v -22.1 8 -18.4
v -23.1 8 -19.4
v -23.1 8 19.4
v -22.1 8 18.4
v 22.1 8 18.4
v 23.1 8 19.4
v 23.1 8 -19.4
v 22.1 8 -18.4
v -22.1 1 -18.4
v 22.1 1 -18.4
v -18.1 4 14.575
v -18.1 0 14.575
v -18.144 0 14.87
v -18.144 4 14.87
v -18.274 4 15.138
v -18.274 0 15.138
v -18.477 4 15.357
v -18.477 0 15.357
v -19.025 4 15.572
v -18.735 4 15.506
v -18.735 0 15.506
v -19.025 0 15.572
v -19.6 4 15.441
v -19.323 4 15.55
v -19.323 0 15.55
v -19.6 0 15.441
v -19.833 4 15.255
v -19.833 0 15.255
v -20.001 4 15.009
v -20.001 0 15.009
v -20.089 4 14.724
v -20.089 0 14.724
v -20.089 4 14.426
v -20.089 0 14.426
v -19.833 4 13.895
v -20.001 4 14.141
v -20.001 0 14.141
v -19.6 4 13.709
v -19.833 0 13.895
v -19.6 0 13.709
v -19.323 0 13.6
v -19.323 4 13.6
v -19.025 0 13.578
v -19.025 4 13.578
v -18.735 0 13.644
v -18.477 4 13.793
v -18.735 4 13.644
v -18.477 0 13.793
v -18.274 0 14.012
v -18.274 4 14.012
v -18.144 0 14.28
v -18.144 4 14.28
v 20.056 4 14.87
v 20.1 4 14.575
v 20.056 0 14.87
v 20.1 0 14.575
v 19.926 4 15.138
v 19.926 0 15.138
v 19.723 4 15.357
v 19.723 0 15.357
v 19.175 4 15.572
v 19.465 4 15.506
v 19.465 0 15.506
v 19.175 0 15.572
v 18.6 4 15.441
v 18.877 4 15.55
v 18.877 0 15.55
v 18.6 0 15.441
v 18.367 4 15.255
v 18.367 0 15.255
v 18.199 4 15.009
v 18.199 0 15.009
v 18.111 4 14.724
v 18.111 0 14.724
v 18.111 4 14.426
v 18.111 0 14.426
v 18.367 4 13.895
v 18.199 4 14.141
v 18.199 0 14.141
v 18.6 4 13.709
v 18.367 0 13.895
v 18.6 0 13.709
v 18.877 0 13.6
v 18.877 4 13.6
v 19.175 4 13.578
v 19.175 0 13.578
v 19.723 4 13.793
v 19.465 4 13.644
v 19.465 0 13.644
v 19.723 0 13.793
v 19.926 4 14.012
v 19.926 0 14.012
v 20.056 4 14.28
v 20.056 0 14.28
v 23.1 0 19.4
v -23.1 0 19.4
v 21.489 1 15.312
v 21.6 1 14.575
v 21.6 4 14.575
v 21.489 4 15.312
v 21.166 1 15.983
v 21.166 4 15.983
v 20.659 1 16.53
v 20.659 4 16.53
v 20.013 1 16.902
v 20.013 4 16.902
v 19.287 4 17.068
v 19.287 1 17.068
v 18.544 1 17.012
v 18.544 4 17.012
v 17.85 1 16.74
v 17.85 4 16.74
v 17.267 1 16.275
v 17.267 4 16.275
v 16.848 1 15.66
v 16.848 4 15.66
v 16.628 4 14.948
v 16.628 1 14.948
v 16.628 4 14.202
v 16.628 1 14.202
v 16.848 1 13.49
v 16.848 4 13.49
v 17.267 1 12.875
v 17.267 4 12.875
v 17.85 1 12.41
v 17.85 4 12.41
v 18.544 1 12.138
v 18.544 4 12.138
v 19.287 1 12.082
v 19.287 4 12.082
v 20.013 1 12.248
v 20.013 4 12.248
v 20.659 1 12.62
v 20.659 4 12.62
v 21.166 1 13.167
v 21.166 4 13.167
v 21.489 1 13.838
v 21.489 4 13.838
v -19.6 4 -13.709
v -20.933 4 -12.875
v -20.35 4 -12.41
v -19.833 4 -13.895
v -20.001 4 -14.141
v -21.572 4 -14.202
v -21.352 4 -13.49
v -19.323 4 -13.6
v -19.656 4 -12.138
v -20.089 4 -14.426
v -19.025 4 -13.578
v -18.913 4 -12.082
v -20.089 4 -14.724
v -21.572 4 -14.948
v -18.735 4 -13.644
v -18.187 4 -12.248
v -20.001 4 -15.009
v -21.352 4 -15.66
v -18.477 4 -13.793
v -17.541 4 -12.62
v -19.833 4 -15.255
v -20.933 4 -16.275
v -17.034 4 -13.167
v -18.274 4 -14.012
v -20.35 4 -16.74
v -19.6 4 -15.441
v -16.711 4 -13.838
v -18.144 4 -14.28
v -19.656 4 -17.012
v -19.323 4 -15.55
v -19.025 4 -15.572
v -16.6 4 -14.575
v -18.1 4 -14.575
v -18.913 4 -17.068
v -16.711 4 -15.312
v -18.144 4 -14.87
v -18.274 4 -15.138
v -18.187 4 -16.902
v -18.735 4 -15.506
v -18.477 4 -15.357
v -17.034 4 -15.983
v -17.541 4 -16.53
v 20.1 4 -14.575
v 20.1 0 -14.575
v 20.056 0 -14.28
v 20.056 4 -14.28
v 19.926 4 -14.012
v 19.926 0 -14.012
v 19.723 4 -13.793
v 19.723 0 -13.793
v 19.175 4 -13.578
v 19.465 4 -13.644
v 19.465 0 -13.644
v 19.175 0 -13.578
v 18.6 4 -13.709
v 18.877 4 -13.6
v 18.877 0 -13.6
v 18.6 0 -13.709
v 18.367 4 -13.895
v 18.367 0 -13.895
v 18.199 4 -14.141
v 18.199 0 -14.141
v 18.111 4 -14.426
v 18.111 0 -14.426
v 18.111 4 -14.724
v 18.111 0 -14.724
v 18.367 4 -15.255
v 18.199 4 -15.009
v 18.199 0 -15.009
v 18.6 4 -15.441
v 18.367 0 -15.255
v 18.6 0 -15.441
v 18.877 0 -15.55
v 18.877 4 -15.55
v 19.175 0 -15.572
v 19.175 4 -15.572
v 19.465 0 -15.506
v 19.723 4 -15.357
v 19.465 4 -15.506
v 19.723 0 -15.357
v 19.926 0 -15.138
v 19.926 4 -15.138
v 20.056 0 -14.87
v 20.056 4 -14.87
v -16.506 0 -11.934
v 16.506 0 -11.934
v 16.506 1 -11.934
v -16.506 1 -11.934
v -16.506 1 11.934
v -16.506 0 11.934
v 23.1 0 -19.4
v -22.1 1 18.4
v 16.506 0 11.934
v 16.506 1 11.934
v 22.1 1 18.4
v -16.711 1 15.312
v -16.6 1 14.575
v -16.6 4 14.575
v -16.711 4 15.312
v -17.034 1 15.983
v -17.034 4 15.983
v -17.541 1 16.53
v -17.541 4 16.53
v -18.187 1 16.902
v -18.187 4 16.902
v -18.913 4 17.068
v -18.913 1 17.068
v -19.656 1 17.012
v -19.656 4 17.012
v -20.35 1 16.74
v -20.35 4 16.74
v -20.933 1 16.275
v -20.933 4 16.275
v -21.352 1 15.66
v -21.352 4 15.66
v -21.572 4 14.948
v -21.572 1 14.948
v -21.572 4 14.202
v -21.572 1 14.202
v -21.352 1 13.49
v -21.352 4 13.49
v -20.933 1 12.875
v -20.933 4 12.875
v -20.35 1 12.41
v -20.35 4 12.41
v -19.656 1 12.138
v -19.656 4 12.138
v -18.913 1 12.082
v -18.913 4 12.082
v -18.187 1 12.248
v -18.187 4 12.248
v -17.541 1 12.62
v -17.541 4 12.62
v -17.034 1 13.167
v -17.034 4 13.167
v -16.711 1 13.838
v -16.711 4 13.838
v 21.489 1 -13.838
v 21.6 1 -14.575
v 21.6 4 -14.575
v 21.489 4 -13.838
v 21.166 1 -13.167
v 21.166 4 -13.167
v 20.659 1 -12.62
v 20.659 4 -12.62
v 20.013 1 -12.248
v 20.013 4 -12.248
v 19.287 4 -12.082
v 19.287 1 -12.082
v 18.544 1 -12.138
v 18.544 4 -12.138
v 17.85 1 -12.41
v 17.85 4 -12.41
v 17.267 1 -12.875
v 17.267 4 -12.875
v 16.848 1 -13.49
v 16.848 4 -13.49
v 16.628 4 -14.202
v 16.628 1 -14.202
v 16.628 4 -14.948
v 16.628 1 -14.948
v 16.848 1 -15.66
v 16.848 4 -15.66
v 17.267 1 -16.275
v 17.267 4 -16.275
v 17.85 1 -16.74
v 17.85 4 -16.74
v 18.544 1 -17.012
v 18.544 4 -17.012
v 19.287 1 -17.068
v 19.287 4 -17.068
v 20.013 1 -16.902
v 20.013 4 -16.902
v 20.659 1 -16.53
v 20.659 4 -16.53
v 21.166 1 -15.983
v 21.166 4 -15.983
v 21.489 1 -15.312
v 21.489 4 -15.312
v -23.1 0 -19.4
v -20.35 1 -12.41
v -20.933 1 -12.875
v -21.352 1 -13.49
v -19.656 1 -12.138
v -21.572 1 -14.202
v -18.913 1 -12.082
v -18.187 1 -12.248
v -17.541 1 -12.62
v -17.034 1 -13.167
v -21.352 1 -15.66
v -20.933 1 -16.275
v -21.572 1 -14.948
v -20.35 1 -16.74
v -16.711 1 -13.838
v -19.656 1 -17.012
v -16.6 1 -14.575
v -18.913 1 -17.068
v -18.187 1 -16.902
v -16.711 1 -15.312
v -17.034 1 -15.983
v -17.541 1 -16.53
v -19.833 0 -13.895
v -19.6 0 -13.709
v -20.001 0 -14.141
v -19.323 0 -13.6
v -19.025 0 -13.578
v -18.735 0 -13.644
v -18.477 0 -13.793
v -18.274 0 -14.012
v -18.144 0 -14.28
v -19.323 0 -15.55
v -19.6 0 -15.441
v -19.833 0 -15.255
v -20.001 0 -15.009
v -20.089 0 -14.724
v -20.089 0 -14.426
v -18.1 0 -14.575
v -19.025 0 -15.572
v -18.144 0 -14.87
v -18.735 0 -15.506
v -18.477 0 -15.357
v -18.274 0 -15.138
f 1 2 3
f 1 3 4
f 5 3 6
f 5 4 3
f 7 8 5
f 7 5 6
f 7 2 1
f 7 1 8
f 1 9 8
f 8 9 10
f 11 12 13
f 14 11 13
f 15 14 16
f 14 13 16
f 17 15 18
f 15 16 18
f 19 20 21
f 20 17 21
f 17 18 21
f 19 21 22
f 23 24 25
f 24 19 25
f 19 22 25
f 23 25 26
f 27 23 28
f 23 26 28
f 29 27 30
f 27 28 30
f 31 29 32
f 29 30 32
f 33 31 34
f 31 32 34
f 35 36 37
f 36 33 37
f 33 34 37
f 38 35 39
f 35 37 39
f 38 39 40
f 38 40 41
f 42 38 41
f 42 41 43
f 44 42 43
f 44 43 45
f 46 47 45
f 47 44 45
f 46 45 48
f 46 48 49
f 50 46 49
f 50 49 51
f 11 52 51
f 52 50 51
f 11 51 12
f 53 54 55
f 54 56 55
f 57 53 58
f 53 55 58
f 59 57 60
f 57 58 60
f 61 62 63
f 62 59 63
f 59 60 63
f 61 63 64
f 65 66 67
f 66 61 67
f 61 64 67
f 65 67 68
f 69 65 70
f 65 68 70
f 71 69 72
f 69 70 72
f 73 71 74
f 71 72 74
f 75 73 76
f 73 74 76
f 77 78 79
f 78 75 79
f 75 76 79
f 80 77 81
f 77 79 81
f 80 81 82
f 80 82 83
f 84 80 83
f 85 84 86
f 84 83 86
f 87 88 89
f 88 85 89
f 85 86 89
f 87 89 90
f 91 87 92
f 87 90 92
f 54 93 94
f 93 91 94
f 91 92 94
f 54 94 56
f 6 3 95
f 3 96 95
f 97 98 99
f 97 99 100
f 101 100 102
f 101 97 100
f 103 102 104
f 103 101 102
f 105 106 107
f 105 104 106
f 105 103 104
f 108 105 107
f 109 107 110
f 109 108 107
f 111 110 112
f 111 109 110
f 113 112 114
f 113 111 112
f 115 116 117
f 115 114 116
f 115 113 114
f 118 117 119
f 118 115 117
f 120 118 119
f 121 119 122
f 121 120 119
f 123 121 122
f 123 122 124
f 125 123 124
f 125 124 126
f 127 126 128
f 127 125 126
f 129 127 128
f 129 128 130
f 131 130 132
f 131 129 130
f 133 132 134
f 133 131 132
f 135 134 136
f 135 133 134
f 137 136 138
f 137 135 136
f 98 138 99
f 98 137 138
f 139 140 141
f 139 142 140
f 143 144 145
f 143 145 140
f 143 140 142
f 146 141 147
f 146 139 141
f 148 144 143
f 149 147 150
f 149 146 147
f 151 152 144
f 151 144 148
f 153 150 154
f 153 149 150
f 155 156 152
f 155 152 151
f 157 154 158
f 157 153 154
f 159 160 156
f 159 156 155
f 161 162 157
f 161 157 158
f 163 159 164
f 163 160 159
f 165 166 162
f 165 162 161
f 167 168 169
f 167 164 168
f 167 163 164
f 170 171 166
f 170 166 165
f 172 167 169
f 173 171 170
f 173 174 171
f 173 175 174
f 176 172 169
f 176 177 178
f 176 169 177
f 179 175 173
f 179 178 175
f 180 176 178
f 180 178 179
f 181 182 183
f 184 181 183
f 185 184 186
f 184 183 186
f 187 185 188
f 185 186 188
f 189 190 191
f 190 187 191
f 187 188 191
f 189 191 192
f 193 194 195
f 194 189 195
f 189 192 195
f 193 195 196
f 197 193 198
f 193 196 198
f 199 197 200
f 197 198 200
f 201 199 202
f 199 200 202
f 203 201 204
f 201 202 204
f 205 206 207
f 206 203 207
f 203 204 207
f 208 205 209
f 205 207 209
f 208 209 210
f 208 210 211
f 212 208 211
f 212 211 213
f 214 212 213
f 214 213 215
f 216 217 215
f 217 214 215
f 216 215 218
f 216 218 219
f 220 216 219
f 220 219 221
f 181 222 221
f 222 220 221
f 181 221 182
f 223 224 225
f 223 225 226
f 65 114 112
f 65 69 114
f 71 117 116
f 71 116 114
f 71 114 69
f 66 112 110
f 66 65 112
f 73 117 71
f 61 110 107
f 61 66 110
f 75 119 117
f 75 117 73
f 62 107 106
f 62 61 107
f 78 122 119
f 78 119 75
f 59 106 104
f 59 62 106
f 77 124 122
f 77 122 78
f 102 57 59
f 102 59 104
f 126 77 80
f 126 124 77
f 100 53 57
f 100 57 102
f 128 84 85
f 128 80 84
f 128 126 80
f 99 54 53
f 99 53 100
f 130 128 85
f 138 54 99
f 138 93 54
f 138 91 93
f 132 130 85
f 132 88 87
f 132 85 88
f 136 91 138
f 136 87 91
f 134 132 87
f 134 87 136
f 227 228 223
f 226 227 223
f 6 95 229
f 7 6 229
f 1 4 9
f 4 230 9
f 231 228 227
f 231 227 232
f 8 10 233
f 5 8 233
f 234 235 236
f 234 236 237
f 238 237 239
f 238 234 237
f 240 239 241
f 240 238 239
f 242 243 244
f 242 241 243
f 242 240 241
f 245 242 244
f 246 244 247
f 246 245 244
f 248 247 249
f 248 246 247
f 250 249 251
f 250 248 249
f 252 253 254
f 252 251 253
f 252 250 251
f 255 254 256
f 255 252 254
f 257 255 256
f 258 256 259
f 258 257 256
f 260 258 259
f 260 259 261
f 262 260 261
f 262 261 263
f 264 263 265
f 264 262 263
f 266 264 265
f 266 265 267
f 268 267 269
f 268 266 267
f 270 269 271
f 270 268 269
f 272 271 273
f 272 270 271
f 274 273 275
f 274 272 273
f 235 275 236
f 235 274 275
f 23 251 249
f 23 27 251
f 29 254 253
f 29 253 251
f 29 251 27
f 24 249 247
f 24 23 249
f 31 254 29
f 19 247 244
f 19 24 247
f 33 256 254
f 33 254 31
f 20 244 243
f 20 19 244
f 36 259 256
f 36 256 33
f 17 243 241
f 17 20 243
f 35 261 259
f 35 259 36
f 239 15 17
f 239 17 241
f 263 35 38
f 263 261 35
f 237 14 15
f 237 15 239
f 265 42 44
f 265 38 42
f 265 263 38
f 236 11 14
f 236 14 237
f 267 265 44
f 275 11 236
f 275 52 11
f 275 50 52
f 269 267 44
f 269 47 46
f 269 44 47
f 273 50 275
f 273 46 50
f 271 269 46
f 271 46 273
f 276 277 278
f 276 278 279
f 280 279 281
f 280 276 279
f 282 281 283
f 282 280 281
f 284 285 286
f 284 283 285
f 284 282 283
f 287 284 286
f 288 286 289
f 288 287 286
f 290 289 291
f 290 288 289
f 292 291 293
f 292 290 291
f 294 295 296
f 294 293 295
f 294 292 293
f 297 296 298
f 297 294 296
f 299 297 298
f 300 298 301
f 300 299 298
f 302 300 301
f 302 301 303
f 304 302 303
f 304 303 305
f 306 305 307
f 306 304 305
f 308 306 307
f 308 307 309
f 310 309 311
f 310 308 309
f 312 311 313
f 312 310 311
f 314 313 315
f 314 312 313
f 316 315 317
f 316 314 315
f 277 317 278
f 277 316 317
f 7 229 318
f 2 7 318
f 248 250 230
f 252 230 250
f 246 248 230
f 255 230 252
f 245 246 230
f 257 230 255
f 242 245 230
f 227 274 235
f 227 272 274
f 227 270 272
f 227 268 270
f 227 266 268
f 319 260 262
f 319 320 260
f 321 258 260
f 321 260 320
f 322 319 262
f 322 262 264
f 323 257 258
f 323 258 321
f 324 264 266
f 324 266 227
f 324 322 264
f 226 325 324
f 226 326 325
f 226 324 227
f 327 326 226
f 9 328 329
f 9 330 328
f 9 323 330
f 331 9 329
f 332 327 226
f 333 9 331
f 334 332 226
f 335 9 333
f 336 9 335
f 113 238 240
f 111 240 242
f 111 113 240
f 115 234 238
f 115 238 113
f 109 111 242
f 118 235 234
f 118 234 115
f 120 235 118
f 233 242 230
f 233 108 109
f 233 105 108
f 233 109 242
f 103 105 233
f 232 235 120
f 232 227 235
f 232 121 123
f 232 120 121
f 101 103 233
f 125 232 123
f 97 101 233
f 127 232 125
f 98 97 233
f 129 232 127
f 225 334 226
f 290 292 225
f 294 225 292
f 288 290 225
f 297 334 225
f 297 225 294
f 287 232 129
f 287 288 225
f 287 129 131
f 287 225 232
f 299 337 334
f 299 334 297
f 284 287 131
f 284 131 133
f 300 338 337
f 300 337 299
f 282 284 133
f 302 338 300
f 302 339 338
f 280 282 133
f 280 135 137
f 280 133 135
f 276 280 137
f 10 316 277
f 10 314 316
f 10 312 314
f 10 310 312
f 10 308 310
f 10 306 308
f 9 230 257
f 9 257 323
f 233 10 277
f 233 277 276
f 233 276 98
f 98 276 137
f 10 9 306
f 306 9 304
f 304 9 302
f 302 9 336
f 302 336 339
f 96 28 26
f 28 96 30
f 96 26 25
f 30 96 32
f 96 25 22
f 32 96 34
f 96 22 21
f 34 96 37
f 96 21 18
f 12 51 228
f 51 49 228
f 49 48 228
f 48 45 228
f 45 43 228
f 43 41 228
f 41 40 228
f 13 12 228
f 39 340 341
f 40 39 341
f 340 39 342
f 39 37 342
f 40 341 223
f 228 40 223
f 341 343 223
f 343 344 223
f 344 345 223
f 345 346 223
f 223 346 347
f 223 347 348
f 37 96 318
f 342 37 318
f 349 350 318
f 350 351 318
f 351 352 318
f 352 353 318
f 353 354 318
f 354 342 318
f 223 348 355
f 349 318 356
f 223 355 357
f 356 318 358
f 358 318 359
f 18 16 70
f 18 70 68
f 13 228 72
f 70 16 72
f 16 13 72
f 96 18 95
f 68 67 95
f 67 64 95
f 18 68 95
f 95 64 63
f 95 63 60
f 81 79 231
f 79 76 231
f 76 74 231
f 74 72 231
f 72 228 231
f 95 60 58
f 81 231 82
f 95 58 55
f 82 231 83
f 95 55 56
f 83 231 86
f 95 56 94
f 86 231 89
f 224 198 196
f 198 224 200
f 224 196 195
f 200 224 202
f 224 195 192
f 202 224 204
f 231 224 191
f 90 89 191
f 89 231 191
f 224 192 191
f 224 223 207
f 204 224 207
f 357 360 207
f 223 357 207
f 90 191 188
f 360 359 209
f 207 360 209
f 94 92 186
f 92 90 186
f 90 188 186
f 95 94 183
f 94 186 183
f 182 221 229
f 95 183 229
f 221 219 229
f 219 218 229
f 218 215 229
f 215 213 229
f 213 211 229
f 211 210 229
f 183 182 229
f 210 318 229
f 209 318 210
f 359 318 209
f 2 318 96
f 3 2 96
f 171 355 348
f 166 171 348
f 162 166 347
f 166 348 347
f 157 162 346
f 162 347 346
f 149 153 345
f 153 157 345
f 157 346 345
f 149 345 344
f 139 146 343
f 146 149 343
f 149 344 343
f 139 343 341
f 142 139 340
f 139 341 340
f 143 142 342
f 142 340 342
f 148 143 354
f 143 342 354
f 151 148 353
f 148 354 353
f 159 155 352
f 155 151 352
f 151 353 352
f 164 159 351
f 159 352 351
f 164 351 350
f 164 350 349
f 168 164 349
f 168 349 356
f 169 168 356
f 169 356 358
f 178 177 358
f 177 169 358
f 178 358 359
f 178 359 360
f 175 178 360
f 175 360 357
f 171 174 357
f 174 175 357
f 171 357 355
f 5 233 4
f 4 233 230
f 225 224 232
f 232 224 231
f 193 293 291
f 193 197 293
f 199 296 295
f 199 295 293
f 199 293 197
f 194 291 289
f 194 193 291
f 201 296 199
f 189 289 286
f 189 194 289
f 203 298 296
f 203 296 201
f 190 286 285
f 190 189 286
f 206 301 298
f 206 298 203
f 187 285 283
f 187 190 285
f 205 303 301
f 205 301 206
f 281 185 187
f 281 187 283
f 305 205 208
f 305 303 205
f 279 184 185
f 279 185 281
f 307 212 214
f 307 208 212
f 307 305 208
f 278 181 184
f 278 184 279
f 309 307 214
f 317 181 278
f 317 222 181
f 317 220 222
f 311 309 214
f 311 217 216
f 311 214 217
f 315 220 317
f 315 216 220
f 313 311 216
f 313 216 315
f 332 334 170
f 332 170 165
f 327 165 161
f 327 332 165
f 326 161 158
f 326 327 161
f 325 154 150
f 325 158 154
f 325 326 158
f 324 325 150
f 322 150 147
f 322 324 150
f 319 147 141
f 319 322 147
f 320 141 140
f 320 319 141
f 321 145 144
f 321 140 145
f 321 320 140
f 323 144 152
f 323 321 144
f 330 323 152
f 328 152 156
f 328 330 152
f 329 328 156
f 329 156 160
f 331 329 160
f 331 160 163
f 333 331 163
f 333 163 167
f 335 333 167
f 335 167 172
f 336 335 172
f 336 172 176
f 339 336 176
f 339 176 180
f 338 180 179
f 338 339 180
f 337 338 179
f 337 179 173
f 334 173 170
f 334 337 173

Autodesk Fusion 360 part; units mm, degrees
sketch "Sketch1" plane through (0, 0, 0) normal (0, 1, 0) x (1, 0, 0)
  line L0 (19.1, 14.575) -> (-19.1, 14.575) construction
  line L1 (-19.1, 14.575) -> (-19.1, -14.575) construction
  line L2 (-19.1, -14.575) -> (19.1, -14.575) construction
  line L3 (19.1, -14.575) -> (19.1, 14.575) construction
  line L4 (19.1, 14.575) -> (-19.1, -14.575) construction
  line L5 (-19.1, 14.575) -> (19.1, -14.575) construction
  circle A0 centre (-19.1, 14.575) radius 1
  circle A1 centre (19.1, 14.575) radius 1
  circle A2 centre (-19.1, -14.575) radius 1
  circle A3 centre (19.1, -14.575) radius 1
  circle A4 centre (-19.1, 14.575) radius 2.5
  circle A5 centre (19.1, 14.575) radius 2.5
  circle A6 centre (-19.1, -14.575) radius 2.5
  circle A7 centre (19.1, -14.575) radius 2.5
  line L6 (22.1, -18.4) -> (-22.1, -18.4)
  line L7 (-22.1, -18.4) -> (-22.1, 18.4)
  line L8 (-22.1, 18.4) -> (22.1, 18.4)
  line L9 (22.1, 18.4) -> (22.1, -18.4)
  line L10 (22.1, -18.4) -> (-22.1, 18.4) construction
  line L11 (-22.1, -18.4) -> (22.1, 18.4) construction
  line L12 (23.1, 19.4) -> (-23.1, 19.4)
  line L13 (-23.1, 19.4) -> (-23.1, -19.4)
  line L14 (-23.1, -19.4) -> (23.1, -19.4)
  line L15 (23.1, -19.4) -> (23.1, 19.4)
  line L16 (23.1, 19.4) -> (-23.1, -19.4) construction
  line L17 (-23.1, 19.4) -> (23.1, -19.4) construction
  line L18 (-16.5064, 18.4) -> (16.5064, 18.4)
  line L19 (16.5064, 18.4) -> (16.5064, -18.4)
  line L20 (16.5064, -18.4) -> (-16.5064, -18.4)
  line L21 (-16.5064, -18.4) -> (-16.5064, 18.4)
  line L22 (-16.5064, 18.4) -> (16.5064, -18.4) construction
  line L23 (16.5064, 18.4) -> (-16.5064, -18.4) construction
  line L24 (22.1, 11.9339) -> (-22.1, 11.9339)
  line L25 (-22.1, 11.9339) -> (-22.1, -11.9339)
  line L26 (-22.1, -11.9339) -> (22.1, -11.9339)
  line L27 (22.1, -11.9339) -> (22.1, 11.9339)
  line L28 (22.1, 11.9339) -> (-22.1, -11.9339) construction
  line L29 (-22.1, 11.9339) -> (22.1, -11.9339) construction
  dimension "d1" = 29.15
  dimension "d2" = 38.2
  dimension "d3" = 2
  dimension "d4" = 2
  dimension "d5" = 2
  dimension "d6" = 2
  dimension "d7" = 5
  dimension "d8" = 5
  dimension "d9" = 5
  dimension "d10" = 5
  dimension "d11" = 36.8
  dimension "d12" = 1
  dimension "d13" = 1
  dimension "d14" = 44.2
extrude "Extrude1" add sketch "Sketch1" along normal blind 8 contours L12 L13 L14 L15 makes body 1
extrude "Extrude2" add sketch "Sketch1" along normal blind 4 separate body contours A4 | A5 | A6 | A7 makes body 2 at (21.5969, 2.6667, -14.4504) makes body 3 at (-16.6031, 2.6667, 14.6996) makes body 4 at (-16.6031, 2.6667, -14.4504) makes body 5 at (21.5969, 2.6667, 14.6996)
extrude "Extrude3" add sketch "Sketch1" along normal blind 1 contours L6 L9 L19 L26 | L6 L19 L20 L21 L26 | L9 L19 L24 L26 L27 | L6 L7 L21 L26 | L8 L9 L19 L24 | L7 L21 L24 L25 L26 | L8 L18 L19 L21 L24 | L7 L8 L21 L24 bodies 1 2 3 4 5
